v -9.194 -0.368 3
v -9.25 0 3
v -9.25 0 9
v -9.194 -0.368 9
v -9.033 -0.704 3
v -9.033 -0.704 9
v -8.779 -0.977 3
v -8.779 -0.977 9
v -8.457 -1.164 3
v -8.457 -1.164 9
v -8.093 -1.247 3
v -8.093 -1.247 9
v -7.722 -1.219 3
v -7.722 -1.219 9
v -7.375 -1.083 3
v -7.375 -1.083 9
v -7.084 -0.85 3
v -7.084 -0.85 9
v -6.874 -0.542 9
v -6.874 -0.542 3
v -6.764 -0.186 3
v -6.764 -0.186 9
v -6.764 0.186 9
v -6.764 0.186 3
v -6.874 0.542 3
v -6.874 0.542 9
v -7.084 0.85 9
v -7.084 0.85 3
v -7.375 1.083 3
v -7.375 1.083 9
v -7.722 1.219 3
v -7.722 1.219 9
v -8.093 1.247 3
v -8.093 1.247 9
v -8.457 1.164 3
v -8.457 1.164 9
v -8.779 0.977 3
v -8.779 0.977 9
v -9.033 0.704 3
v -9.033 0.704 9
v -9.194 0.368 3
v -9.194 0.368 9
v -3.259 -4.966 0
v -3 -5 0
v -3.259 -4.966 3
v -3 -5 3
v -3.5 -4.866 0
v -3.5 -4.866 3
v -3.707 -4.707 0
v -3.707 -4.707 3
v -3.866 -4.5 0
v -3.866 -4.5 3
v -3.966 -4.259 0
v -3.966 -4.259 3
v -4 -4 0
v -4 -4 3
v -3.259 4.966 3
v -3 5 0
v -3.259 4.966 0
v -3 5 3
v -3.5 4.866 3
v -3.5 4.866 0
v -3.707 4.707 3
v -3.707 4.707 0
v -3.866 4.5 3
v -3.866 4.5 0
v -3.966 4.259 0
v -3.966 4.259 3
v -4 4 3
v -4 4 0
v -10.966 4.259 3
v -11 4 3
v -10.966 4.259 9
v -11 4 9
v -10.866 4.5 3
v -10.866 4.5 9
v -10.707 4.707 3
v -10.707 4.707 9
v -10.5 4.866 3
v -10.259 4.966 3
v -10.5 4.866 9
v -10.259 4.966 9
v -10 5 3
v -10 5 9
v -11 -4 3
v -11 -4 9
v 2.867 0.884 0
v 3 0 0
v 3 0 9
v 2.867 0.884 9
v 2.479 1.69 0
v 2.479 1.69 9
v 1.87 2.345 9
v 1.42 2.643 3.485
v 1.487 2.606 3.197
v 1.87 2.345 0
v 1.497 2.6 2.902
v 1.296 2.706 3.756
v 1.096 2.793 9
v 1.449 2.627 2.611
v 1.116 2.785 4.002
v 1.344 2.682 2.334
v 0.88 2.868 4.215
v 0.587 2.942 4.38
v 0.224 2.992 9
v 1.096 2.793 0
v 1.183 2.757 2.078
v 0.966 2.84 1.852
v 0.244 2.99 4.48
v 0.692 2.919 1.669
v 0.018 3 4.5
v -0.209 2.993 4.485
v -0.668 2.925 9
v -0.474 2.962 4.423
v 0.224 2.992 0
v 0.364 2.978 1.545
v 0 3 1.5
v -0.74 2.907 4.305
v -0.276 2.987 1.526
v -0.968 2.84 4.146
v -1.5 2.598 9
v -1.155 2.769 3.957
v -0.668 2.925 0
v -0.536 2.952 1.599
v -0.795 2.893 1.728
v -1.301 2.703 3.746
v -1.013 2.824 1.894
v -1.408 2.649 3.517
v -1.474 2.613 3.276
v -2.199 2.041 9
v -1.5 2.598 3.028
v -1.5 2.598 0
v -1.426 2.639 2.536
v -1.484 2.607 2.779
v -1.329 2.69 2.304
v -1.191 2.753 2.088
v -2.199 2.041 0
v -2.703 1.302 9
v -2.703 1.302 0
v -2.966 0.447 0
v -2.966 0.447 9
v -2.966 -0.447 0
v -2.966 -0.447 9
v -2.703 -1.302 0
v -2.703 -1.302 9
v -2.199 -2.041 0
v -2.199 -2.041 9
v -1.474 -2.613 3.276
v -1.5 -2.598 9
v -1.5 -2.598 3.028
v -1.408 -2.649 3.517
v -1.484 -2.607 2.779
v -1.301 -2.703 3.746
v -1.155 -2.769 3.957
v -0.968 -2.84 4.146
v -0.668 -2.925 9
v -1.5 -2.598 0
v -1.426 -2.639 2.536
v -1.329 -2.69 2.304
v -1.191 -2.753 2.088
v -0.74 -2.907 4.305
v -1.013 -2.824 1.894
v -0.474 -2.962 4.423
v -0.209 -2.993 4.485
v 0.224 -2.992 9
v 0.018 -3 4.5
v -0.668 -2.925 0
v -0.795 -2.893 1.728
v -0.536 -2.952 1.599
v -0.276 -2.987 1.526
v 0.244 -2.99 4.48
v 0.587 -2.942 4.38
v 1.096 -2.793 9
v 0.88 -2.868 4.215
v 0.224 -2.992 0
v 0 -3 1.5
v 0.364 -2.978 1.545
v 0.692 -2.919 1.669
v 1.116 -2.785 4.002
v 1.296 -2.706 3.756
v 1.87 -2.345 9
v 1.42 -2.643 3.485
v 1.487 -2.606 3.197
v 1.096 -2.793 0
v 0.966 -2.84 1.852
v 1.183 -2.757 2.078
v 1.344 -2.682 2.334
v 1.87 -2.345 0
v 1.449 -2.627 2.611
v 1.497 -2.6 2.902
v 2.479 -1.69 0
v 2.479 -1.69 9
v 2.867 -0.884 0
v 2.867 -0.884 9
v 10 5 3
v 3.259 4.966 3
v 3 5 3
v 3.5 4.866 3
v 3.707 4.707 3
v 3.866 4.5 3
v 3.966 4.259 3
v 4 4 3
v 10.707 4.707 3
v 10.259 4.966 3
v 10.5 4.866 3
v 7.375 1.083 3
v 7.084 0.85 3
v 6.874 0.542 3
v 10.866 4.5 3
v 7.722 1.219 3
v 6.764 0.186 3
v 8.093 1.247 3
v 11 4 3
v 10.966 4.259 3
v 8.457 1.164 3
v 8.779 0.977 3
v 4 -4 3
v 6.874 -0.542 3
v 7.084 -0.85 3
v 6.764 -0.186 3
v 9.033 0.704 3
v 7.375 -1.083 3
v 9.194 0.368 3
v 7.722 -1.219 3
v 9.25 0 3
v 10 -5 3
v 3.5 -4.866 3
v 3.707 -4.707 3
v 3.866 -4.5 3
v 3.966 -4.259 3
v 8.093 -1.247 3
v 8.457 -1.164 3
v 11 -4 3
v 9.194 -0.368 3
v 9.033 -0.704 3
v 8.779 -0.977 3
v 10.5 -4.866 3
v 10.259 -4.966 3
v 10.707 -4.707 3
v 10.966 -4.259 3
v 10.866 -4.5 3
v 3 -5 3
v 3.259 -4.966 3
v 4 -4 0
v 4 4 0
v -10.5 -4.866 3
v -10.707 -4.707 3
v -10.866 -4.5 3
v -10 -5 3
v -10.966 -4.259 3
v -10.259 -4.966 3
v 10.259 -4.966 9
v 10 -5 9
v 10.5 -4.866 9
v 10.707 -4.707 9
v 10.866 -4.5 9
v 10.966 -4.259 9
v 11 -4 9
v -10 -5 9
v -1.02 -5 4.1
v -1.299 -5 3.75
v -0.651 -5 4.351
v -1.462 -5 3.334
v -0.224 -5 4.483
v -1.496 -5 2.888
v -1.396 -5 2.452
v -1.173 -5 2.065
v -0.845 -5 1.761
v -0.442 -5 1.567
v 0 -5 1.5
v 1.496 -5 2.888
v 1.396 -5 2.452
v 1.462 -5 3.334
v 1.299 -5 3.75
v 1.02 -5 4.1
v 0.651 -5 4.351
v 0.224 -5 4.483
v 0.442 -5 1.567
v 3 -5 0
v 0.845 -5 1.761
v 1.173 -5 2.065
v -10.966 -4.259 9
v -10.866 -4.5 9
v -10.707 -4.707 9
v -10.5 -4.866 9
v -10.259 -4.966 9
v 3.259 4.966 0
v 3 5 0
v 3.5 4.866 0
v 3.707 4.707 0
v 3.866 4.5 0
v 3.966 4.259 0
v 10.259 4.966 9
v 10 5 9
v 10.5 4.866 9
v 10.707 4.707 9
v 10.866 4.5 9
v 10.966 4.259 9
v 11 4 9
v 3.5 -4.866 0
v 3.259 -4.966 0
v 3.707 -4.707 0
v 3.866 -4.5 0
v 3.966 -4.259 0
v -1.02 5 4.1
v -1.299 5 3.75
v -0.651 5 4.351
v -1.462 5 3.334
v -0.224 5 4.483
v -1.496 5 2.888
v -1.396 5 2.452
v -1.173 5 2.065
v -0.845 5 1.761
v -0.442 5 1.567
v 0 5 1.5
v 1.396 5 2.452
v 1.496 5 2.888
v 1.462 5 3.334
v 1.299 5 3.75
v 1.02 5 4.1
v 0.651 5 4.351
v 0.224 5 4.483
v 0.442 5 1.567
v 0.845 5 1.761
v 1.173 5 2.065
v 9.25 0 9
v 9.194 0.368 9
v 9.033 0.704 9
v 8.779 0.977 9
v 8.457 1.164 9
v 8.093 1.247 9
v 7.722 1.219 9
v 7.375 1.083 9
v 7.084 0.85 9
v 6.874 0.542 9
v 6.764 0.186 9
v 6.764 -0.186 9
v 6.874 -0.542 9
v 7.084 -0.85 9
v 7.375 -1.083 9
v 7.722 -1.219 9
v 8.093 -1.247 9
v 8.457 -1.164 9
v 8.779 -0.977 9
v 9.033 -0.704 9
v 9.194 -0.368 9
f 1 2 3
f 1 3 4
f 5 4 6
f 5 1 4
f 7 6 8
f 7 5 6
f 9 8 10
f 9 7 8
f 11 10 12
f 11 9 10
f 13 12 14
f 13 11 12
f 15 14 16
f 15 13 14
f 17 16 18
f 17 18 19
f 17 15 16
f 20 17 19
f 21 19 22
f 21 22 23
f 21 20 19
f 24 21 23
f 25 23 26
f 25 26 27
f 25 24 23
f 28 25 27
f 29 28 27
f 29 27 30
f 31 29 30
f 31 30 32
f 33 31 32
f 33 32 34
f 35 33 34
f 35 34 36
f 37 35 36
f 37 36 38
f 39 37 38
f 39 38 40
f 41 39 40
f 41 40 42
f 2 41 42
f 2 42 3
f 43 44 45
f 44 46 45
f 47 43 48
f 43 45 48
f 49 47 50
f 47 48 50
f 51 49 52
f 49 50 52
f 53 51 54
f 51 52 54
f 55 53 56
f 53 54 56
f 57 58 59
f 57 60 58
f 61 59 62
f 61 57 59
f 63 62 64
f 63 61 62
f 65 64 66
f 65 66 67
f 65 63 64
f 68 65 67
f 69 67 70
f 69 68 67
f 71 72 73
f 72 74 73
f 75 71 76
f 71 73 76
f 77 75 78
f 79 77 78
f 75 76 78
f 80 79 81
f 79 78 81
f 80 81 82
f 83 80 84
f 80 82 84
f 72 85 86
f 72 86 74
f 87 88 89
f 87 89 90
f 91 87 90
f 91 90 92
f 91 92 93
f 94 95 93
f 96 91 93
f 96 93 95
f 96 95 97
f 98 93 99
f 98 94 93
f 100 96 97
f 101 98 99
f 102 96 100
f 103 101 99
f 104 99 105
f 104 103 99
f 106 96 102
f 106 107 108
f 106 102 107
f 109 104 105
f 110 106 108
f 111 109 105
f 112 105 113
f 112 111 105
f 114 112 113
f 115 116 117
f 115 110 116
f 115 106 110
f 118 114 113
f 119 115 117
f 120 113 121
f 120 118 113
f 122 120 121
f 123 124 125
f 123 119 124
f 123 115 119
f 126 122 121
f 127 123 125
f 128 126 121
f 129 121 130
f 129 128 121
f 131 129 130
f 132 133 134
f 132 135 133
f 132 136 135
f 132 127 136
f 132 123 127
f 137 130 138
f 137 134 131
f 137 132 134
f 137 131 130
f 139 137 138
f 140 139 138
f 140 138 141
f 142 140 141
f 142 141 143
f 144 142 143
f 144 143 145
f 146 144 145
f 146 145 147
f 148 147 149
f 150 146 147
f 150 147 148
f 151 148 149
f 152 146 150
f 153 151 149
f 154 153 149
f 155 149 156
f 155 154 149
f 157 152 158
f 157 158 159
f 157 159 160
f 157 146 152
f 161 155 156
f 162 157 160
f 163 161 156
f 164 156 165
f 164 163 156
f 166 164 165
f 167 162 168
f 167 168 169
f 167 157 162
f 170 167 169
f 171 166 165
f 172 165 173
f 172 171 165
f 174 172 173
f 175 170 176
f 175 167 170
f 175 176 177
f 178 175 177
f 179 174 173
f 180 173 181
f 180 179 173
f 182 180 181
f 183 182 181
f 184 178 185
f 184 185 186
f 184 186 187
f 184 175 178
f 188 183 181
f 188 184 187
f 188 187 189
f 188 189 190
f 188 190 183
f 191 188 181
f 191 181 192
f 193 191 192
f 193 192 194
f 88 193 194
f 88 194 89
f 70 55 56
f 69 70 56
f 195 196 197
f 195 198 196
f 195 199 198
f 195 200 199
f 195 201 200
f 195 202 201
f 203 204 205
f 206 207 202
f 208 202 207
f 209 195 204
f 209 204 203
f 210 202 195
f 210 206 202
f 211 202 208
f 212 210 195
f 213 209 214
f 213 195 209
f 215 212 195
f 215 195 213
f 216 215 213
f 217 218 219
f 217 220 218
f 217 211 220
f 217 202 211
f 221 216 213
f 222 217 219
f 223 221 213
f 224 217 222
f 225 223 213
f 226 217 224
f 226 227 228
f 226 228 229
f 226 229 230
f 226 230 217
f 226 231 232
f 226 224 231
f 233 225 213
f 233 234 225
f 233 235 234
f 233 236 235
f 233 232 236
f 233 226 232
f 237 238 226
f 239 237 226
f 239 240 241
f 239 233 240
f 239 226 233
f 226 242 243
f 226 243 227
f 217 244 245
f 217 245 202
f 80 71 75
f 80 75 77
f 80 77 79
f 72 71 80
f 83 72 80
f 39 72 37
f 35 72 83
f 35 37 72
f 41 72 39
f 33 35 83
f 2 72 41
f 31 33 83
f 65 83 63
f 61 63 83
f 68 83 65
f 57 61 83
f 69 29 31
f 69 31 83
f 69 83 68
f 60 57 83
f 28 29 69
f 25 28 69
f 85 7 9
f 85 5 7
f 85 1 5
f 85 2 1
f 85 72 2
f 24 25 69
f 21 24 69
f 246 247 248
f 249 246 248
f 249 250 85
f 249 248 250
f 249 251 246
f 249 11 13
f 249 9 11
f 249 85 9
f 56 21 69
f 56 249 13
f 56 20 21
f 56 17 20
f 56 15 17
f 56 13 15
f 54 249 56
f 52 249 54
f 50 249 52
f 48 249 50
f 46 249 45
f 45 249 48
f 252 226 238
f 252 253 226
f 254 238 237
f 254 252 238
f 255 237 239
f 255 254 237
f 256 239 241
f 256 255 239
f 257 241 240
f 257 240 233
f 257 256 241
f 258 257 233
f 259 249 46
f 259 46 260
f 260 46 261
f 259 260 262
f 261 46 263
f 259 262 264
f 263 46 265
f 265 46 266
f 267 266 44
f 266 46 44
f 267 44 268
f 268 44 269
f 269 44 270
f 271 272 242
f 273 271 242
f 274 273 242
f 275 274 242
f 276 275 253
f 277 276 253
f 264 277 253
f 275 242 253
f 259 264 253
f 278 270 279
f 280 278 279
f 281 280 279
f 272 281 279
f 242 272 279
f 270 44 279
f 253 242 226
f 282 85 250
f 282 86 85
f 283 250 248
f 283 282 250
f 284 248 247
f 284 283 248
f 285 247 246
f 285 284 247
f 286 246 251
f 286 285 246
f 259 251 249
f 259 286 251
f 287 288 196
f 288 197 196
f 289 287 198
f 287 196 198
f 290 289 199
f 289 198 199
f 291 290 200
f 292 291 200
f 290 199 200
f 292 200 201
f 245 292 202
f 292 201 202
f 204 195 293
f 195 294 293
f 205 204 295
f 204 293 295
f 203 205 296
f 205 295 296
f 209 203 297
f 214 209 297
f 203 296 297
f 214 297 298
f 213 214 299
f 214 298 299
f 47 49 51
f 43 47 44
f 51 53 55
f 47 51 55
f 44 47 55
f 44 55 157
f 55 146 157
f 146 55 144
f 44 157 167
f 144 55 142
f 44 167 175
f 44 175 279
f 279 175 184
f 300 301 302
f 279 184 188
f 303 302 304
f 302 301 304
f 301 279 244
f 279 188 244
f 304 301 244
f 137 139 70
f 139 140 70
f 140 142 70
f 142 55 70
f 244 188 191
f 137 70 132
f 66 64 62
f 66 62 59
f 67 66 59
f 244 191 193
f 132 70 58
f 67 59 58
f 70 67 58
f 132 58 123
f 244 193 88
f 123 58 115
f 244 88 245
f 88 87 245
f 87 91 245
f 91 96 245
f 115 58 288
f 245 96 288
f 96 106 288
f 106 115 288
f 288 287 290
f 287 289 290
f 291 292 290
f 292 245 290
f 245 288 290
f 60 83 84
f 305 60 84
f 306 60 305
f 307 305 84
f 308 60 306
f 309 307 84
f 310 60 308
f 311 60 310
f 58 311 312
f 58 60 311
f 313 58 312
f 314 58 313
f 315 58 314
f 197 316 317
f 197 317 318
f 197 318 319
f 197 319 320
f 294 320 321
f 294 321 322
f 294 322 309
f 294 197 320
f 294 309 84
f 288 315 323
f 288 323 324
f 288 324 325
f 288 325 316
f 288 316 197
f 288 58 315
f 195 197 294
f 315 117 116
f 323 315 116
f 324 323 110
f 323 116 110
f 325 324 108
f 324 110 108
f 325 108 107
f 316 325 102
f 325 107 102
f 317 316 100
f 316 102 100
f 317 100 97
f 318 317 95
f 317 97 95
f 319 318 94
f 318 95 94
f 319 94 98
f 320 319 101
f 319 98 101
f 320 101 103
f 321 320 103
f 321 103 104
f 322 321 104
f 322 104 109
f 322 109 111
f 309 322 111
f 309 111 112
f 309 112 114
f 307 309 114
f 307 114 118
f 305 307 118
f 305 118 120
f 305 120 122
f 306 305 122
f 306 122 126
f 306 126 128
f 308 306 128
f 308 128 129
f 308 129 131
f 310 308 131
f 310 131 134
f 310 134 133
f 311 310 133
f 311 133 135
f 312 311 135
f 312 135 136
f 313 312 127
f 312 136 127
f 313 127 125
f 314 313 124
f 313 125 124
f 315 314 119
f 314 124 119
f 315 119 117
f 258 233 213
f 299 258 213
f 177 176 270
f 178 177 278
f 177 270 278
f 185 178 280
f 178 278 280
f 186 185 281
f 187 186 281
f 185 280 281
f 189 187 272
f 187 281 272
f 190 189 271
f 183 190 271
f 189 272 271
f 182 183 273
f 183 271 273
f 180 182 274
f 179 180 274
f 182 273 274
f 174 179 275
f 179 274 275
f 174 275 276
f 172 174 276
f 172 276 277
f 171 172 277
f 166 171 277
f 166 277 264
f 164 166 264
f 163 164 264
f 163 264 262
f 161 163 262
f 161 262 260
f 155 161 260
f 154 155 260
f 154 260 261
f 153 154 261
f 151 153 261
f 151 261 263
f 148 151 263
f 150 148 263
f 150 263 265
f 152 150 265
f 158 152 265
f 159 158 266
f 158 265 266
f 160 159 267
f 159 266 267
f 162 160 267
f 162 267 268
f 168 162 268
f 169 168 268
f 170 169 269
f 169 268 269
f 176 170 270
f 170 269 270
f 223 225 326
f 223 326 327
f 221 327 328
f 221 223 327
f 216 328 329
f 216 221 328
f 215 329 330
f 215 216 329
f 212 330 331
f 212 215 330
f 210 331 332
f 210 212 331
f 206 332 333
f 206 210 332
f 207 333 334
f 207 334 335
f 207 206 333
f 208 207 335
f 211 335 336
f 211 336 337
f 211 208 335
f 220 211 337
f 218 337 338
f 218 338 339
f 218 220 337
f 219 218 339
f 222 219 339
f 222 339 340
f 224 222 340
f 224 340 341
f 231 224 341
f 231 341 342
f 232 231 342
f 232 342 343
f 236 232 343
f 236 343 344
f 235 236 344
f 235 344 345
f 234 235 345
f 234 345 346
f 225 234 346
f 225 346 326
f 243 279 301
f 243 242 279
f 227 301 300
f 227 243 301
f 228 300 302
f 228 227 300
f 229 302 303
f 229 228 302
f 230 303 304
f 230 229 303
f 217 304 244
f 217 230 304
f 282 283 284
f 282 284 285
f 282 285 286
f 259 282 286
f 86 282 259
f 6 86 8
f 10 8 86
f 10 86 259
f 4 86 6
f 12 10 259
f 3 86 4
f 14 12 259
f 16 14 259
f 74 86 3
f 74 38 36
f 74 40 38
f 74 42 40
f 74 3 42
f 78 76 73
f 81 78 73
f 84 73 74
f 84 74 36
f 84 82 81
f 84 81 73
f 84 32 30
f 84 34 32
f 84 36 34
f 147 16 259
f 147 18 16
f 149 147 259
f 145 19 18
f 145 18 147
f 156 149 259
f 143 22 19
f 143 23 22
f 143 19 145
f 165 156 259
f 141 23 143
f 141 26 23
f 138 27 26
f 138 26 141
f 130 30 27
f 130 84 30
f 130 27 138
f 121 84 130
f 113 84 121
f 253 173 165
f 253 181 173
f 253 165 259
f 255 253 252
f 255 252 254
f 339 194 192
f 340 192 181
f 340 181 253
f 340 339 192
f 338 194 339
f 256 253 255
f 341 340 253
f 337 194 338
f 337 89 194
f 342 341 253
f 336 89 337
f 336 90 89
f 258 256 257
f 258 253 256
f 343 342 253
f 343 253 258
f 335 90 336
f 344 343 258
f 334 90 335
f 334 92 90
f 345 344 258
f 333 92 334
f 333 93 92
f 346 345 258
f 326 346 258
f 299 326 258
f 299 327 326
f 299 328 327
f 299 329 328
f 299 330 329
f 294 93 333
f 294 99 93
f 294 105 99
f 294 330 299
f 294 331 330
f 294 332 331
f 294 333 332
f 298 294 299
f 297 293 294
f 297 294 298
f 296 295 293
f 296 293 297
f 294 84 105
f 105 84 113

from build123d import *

# Parameters (mm, degrees)
SKETCH_1_W          = 22
SKETCH_1_H          = 10
SKETCH_1_R          = 1.25
SKETCH_1_R_2        = 3
EXTRUDE_1_DEPTH     = 9
SKETCH_2_R          = 1.5
CUT_EXTRUDE_1_DEPTH = 11
SKETCH_4_W          = 7
SKETCH_4_H          = 3
CUT_EXTRUDE_2_DEPTH = 10
FILLET_1_R          = 1


with BuildPart() as part:
    # 草图1 → 凸台-拉伸1 (new body)
    with BuildSketch(Plane.XY):
        Rectangle(SKETCH_1_W, SKETCH_1_H)
        with Locations((8, 0)):
            Circle(SKETCH_1_R, mode=Mode.SUBTRACT)
        with Locations(Location((-8, 0, 0), (0, 0, 180))):
            Circle(SKETCH_1_R, mode=Mode.SUBTRACT)
        Circle(SKETCH_1_R_2, mode=Mode.SUBTRACT)
    extrude(amount=EXTRUDE_1_DEPTH)

    # 草图2 → 切除-拉伸1 (cut)
    with BuildSketch(Plane.XZ.offset(5)):
        with Locations(Location((0, 3, 0), (0, 0, 270))):
            Circle(SKETCH_2_R)
    extrude(amount=-CUT_EXTRUDE_1_DEPTH, mode=Mode.SUBTRACT)

    # 草图4 → 切除-拉伸2 (cut)
    with BuildSketch(Plane.XZ.offset(5)):
        with Locations((-7.5, 1.5)):
            Rectangle(SKETCH_4_W, SKETCH_4_H)
        with Locations((7.5, 1.5)):
            Rectangle(SKETCH_4_W, SKETCH_4_H)
    extrude(amount=-CUT_EXTRUDE_2_DEPTH, mode=Mode.SUBTRACT)

    # 圆角1
    fillet_1_edges = [part.edges().sort_by_distance(p)[0] for p in [
        (-4, 5, 1.5),
        (-4, -5, 1.5),
        (4, 5, 1.5),
        (4, -5, 1.5),
        (11, -5, 6),
        (-11, -5, 6),
        (-11, 5, 6),
        (11, 5, 6),
    ]]
    fillet(fillet_1_edges, radius=FILLET_1_R)


solid = part.part
